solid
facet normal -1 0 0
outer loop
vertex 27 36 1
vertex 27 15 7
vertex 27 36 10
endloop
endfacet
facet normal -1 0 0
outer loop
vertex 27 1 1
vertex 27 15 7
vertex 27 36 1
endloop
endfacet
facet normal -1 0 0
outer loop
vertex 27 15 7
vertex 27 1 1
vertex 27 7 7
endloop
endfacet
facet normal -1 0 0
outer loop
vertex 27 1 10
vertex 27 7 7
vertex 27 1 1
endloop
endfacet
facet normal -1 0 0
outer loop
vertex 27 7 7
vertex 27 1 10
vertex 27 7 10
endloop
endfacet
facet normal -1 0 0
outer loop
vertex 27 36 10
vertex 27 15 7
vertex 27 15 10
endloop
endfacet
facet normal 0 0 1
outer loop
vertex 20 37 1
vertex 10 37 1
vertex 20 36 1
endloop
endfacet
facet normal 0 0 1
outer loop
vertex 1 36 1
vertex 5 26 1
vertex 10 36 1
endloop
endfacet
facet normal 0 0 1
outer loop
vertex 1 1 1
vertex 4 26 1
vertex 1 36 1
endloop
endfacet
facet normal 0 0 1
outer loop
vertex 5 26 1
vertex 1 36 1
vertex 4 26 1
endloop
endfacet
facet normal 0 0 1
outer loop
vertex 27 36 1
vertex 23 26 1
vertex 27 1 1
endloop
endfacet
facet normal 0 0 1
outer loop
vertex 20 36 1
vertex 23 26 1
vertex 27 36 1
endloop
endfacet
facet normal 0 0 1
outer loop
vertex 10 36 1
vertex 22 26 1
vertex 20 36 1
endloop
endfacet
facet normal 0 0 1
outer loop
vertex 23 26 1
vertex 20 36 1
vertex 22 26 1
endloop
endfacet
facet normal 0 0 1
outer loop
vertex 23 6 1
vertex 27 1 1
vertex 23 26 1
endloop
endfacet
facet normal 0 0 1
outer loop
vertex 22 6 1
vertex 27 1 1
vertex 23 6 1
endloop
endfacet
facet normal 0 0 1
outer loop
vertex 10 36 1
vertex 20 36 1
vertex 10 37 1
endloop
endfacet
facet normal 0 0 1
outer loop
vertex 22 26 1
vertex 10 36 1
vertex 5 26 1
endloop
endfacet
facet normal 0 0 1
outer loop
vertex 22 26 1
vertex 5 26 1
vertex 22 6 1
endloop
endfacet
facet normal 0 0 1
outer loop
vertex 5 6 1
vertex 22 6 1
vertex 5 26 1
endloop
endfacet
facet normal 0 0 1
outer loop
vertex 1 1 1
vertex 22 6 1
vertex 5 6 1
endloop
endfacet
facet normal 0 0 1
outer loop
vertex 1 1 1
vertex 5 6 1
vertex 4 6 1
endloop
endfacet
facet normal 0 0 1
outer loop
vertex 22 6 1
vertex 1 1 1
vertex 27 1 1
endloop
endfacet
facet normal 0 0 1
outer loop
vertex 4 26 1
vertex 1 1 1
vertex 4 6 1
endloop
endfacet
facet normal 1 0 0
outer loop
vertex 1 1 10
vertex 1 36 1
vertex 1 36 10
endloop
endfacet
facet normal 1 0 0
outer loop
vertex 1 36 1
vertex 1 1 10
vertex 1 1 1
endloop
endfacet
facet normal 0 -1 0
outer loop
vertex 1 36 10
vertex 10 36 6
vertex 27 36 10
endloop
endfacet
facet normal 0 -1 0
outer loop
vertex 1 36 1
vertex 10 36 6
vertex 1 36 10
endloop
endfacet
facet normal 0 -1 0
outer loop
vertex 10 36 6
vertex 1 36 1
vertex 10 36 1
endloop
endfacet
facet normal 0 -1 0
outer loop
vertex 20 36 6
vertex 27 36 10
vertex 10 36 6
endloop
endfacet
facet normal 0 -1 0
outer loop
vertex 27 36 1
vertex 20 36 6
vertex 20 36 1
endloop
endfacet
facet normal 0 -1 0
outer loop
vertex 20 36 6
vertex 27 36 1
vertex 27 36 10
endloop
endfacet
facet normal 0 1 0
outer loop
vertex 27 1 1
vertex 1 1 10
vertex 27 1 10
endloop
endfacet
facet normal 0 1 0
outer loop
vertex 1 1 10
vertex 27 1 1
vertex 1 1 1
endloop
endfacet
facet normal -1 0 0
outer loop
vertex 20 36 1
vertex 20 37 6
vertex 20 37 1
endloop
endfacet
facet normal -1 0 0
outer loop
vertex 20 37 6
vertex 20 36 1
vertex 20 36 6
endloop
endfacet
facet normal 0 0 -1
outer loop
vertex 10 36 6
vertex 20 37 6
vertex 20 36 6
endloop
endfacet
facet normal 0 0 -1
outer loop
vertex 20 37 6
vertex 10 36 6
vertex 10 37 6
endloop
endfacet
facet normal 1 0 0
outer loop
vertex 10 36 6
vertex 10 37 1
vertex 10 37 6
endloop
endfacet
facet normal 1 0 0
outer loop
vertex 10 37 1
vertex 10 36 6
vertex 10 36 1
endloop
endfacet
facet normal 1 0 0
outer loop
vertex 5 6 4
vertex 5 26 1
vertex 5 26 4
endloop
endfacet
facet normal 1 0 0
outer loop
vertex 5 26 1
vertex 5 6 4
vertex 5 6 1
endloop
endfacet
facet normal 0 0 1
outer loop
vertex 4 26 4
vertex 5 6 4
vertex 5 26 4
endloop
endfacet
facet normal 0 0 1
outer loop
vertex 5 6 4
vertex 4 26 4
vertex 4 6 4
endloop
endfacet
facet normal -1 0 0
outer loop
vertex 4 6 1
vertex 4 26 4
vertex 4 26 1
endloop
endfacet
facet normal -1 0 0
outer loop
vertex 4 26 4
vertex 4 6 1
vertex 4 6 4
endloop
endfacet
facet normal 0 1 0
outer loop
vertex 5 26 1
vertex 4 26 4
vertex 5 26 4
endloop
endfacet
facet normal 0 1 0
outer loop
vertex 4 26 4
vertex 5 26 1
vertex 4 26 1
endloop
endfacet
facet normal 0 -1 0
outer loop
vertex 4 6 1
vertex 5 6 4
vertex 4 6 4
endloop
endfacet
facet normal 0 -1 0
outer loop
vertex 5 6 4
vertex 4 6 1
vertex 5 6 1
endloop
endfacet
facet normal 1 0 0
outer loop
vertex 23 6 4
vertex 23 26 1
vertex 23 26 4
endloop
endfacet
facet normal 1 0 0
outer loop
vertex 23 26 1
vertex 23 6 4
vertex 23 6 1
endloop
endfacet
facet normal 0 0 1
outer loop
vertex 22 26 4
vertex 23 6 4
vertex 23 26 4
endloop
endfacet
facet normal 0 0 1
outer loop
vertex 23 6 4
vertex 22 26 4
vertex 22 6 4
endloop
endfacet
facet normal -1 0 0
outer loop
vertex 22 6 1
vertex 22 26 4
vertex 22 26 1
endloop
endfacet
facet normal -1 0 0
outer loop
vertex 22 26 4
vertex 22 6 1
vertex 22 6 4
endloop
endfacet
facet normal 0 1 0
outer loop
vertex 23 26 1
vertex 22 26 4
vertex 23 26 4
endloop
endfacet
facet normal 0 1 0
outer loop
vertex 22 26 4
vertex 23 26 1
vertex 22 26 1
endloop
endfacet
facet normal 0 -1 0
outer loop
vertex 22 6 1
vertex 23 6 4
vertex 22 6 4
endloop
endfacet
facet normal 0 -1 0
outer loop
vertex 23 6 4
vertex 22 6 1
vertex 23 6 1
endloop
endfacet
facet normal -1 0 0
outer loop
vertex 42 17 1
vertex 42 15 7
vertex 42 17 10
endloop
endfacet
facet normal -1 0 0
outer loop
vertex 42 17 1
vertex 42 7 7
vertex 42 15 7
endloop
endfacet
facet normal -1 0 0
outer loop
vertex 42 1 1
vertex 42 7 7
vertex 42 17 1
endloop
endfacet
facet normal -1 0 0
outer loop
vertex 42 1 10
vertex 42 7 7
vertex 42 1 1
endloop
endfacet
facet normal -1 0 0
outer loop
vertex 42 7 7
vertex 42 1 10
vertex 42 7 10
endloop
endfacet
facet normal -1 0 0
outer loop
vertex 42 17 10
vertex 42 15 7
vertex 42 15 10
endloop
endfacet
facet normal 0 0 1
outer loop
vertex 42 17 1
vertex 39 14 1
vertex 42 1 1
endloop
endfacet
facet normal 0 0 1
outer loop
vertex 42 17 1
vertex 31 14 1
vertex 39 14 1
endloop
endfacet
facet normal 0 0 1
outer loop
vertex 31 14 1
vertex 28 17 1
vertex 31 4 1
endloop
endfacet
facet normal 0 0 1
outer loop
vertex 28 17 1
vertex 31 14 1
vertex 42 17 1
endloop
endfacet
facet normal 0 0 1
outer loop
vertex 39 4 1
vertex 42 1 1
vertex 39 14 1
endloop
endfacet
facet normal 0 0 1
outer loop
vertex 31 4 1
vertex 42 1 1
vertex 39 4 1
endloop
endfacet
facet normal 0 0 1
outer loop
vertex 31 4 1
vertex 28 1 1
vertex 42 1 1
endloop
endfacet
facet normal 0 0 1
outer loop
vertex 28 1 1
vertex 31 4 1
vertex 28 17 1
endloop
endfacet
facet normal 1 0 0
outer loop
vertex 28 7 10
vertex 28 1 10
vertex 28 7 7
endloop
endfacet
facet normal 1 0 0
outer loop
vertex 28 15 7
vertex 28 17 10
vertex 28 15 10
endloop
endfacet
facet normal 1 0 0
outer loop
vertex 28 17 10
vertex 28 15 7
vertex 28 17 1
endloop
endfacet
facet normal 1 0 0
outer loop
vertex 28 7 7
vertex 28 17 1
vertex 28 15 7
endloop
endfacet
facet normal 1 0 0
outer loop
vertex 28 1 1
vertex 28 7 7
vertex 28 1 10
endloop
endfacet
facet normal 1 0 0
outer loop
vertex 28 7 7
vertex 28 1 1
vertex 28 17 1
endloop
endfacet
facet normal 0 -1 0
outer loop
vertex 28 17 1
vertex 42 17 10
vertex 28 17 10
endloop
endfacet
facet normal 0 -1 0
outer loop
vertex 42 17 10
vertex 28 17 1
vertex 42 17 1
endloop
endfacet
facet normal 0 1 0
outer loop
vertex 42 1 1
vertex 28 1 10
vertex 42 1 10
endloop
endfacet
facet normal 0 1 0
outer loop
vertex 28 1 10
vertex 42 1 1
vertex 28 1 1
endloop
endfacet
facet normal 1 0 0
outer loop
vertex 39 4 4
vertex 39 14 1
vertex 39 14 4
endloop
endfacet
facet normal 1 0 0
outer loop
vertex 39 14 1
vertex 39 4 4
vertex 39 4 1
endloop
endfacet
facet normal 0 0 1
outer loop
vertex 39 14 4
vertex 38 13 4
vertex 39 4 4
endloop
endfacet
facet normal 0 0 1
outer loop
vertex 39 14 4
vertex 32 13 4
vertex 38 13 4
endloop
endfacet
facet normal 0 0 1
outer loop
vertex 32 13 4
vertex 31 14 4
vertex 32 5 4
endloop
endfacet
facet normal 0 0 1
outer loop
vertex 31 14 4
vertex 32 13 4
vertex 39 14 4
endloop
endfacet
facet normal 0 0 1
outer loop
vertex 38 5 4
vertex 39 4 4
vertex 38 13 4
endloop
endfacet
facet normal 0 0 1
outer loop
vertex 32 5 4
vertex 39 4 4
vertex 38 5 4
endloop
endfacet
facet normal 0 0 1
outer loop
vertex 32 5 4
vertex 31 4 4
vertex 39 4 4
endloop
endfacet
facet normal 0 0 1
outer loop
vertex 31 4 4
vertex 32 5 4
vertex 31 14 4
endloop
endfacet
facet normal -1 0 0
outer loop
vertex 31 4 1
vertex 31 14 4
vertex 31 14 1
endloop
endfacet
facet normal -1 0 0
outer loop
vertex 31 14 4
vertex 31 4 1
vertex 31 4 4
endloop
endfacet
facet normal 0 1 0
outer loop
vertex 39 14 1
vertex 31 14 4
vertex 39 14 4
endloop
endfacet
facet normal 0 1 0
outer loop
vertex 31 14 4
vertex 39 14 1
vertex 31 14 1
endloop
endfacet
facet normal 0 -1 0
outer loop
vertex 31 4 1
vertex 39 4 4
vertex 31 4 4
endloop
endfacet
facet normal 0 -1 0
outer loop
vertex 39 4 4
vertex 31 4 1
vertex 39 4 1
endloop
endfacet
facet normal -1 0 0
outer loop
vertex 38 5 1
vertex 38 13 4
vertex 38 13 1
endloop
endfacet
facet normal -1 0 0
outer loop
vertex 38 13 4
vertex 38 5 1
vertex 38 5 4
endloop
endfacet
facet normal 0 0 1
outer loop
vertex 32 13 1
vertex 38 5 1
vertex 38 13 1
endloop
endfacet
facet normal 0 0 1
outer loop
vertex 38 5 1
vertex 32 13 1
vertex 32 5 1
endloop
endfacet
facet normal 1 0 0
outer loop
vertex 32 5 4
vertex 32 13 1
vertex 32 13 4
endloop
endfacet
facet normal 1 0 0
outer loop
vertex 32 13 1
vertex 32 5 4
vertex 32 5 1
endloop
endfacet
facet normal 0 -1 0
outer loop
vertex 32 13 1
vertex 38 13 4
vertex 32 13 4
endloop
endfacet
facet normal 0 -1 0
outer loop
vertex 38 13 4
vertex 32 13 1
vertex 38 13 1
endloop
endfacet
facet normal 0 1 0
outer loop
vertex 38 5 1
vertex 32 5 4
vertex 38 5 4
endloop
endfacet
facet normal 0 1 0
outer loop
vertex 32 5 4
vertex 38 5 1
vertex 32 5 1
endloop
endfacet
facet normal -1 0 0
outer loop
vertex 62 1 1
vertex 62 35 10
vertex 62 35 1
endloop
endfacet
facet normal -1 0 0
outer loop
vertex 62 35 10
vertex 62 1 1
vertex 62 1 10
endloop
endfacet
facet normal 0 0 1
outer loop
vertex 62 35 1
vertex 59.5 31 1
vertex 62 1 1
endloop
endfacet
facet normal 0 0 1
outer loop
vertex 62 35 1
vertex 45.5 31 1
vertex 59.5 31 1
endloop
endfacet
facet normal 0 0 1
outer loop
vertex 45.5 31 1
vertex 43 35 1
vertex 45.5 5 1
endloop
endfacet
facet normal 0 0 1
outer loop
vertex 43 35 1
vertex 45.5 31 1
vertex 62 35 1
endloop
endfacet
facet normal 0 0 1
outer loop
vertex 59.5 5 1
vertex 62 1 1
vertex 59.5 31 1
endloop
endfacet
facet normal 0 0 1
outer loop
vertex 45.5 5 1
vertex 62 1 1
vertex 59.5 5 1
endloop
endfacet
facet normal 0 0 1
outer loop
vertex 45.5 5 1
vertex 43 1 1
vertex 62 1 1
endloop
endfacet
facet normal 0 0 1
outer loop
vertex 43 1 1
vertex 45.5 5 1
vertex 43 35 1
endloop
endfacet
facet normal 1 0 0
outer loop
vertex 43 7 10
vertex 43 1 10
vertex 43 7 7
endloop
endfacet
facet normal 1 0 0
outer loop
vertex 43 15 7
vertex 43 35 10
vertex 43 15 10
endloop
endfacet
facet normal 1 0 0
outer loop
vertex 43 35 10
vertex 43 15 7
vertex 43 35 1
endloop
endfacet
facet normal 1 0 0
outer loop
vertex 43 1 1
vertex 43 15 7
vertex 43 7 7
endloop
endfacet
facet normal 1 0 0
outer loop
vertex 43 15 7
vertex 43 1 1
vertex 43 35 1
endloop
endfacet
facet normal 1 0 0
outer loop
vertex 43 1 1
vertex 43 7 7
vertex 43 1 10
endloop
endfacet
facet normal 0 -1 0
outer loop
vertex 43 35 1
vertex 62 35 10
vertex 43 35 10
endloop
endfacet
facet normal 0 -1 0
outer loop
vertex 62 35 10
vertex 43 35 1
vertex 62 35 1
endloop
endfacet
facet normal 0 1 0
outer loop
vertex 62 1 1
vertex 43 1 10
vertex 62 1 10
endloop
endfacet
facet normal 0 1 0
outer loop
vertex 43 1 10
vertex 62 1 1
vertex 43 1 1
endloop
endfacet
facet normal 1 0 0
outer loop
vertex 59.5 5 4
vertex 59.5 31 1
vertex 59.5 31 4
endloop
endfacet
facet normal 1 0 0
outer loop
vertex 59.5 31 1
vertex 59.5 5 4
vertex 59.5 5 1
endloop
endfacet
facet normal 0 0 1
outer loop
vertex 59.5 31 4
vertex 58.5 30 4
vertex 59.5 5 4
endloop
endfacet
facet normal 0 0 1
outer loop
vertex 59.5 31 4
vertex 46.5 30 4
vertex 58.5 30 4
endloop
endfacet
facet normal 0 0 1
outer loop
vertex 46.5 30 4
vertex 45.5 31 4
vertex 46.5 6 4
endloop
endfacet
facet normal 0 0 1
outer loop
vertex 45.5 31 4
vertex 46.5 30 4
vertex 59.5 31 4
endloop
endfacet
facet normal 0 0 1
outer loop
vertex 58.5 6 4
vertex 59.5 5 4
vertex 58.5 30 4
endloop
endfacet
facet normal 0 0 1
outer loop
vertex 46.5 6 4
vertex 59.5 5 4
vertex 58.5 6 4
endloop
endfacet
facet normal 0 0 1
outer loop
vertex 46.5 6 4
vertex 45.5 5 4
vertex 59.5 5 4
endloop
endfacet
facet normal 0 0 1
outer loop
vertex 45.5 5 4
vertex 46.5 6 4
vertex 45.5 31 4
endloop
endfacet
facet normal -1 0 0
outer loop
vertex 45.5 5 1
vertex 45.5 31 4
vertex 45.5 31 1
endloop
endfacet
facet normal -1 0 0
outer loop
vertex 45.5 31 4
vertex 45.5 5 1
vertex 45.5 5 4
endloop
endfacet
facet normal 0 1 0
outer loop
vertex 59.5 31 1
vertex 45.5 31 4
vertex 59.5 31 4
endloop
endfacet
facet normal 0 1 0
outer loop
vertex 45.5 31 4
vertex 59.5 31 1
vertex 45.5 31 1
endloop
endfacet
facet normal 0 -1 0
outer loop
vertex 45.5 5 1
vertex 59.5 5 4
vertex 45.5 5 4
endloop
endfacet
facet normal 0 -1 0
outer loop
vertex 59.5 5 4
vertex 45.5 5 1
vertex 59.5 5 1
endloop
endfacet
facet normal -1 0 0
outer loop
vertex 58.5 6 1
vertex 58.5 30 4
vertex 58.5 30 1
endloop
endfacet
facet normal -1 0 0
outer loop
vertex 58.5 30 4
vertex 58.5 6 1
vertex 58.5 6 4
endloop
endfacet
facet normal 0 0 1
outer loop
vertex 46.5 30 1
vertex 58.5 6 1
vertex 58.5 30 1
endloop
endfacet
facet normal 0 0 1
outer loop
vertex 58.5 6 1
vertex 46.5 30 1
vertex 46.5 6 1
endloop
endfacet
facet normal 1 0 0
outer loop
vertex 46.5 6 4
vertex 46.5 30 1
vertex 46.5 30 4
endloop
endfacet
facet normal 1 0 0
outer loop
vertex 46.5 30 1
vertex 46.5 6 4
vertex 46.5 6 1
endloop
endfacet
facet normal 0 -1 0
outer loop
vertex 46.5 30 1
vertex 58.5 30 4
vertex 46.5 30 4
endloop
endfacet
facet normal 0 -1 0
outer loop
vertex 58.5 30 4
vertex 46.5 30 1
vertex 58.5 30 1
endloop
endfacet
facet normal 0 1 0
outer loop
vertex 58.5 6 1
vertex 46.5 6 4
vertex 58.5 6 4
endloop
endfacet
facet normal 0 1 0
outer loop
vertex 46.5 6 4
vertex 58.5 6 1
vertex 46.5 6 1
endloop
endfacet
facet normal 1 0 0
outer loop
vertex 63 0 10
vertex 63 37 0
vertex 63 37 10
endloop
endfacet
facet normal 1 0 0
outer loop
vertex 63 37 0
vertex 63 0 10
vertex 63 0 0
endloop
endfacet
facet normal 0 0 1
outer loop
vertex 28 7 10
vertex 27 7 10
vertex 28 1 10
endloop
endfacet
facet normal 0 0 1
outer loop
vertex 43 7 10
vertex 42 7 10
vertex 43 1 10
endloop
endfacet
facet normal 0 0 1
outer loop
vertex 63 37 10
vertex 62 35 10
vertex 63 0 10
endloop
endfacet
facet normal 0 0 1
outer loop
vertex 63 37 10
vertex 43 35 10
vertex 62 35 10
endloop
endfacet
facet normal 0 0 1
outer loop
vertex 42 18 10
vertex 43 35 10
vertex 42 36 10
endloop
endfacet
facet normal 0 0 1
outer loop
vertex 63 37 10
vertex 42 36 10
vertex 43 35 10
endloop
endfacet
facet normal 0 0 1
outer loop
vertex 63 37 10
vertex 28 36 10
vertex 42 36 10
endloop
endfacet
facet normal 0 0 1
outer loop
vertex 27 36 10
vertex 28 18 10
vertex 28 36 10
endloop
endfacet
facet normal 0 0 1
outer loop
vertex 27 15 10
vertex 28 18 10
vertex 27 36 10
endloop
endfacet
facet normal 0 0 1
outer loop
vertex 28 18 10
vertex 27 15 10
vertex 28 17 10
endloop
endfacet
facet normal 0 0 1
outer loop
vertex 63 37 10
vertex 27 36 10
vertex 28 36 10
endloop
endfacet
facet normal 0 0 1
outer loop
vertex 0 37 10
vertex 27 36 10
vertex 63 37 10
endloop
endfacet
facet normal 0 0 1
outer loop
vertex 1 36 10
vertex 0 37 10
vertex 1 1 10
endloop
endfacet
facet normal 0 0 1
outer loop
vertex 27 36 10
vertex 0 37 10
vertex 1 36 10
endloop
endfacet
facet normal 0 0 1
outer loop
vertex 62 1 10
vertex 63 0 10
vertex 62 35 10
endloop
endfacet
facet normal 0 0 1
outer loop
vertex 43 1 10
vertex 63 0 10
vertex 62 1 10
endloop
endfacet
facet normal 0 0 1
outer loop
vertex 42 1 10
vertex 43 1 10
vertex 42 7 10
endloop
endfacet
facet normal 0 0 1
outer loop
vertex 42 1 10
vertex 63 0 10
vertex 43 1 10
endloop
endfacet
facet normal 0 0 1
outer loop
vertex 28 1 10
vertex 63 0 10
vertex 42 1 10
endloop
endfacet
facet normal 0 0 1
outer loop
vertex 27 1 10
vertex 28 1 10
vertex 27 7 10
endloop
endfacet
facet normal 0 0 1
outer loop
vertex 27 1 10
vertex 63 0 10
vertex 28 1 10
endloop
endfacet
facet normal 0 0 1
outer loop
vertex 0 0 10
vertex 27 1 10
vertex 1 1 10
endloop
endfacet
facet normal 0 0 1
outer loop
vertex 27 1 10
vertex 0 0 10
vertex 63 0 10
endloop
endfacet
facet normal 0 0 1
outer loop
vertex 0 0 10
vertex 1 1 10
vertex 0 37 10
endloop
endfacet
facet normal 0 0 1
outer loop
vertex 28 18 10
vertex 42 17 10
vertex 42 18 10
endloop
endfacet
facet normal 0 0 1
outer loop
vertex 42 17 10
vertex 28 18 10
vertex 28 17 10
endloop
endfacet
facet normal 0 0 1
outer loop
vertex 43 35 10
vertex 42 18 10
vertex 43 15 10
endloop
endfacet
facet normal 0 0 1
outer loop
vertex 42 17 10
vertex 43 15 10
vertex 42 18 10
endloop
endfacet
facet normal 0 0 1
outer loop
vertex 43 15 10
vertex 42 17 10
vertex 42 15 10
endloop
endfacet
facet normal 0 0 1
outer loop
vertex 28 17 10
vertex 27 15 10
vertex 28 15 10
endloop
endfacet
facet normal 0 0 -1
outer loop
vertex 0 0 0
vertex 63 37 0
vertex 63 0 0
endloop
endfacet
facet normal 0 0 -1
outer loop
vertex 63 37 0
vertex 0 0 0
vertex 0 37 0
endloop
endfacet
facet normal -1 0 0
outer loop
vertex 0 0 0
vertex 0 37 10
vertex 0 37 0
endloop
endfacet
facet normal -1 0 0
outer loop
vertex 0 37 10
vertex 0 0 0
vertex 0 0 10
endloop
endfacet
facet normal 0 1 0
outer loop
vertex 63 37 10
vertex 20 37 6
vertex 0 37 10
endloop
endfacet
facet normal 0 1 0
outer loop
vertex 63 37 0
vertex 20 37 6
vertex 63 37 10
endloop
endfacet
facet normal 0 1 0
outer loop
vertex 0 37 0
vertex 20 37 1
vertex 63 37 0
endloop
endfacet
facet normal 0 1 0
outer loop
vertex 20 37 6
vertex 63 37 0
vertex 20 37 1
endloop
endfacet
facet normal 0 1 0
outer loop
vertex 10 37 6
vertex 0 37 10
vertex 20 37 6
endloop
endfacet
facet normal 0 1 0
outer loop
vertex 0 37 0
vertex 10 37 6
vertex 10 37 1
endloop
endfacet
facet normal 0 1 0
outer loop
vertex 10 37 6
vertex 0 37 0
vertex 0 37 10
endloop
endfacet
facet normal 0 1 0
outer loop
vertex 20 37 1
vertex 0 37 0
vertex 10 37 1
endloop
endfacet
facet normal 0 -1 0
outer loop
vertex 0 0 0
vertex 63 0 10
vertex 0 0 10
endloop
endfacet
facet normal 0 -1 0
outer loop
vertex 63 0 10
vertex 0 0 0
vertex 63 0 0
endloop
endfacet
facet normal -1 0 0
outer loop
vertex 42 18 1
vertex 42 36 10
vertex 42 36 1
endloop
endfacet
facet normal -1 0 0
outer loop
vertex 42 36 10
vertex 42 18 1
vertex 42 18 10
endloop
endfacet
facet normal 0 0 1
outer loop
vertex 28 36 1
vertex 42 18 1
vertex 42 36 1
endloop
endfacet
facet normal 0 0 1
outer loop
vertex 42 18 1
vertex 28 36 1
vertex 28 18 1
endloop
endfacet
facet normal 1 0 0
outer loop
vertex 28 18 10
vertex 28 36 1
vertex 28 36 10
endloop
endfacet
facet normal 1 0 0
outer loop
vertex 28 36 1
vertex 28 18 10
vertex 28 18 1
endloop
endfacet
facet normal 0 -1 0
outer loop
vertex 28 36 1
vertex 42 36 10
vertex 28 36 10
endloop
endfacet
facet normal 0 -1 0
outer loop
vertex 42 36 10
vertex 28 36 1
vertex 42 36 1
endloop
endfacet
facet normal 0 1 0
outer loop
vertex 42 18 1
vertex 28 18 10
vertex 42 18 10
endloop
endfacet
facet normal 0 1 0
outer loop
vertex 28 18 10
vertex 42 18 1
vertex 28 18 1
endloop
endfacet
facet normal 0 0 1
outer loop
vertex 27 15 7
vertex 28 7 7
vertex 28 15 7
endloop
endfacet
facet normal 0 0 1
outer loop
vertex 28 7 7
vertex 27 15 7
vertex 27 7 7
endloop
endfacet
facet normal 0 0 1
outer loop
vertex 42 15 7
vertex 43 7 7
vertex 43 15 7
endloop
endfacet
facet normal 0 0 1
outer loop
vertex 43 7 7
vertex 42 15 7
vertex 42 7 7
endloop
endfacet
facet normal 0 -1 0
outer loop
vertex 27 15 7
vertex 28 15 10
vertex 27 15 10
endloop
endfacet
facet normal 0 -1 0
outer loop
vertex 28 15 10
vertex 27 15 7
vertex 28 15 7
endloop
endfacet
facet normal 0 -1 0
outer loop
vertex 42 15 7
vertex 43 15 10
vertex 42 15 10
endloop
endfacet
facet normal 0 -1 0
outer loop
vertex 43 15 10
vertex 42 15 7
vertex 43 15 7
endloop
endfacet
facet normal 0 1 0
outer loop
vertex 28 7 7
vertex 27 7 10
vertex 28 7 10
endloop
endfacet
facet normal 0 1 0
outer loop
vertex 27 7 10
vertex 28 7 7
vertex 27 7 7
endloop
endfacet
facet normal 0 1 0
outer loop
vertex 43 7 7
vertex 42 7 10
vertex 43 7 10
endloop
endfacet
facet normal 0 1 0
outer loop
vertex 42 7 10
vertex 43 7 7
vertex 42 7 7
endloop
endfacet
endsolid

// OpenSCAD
// OPENSCA Model for encloser for Tine's table
// Curently 3 devices Waatuino, 3.3v to 5v and esp wemos d1 mini
$fn=100;
module wemos(){
    difference(){
        union(){
            //wemos d1 mini 26mmx35mm h7mm 
            cube([26,35,10],center=false);
            #translate([9,32,0]) cube([10,5,5],center=false);
        }
        translate([3,5,0]) cube([1,20,3]);
        translate([21,5,0]) cube([1,20,3]);
    }
}
module v5v3(){
    union(){
        difference(){
            //volatege level shifter 5v 3v 14mmx16mm h7mm 
            cube([14,16,10],center=false);
            translate([3,3,0]) cube([8,10,3]);
        }
        translate([4,4,0]) cube([6,8,3]);

    }
}
module blanker(){
    //volatege level shifter 5v 3v 14mmx16mm h7mm 
    cube([14,18,10],center=false);
}
module wattuino(){
    //wattuino arduino 5v clone 22mmx32mm h7mm 
    union(){
        difference(){
            cube([19,34,10],center=false);
            translate([2.5,4,0]) cube([14,26,3],center=false);
        }
        translate([3.5,5,0]) cube([12,24,3],center=false); 
    }
}
module casing(){
    //outer casing 
    cube([63,37,10],center=false);
}
module cabling(){
    //cabling boom 
    cube([50,8,3],center=false);
}
module xadow_pin(){
    union(){
        translate([0,0,0]) cylinder(h=1,r1=1,r2=1);
        translate([0,0,1]) cylinder(h=3,r1=1,r2=.5);
    }
}
module xadow_gsm(){
    difference(){    
    union(){
            //Xadow madule
            //turns out the GSM module has exactly  25.37mm X 20.30mm / 1’’ X 0.8’’
            //approx 2mm hole 17.5mm x18mm
            cube([25.4,20.3,.75],center=false);
            translate([3,1.5,0]) xadow_pin();
            translate([21.4,1.5,0]) xadow_pin();
            translate([3,18.5,0]) xadow_pin();
            translate([21.4,18.5,0]) xadow_pin();
            }
            #translate([25.4,20.3,0]) cylinder(h=1,r1=1,r2=1);
        }

}
module enclosure(){
    //outer casing and substract
    difference(){
        casing();
        translate([1,1,1]) wemos();
        translate([28,1,1]) v5v3();
        translate([43,1,1]) wattuino();
        translate([28,18,1]) blanker();
        #translate([7,7,7]) cabling();
        }
}

enclosure();
*xadow_gsm();
